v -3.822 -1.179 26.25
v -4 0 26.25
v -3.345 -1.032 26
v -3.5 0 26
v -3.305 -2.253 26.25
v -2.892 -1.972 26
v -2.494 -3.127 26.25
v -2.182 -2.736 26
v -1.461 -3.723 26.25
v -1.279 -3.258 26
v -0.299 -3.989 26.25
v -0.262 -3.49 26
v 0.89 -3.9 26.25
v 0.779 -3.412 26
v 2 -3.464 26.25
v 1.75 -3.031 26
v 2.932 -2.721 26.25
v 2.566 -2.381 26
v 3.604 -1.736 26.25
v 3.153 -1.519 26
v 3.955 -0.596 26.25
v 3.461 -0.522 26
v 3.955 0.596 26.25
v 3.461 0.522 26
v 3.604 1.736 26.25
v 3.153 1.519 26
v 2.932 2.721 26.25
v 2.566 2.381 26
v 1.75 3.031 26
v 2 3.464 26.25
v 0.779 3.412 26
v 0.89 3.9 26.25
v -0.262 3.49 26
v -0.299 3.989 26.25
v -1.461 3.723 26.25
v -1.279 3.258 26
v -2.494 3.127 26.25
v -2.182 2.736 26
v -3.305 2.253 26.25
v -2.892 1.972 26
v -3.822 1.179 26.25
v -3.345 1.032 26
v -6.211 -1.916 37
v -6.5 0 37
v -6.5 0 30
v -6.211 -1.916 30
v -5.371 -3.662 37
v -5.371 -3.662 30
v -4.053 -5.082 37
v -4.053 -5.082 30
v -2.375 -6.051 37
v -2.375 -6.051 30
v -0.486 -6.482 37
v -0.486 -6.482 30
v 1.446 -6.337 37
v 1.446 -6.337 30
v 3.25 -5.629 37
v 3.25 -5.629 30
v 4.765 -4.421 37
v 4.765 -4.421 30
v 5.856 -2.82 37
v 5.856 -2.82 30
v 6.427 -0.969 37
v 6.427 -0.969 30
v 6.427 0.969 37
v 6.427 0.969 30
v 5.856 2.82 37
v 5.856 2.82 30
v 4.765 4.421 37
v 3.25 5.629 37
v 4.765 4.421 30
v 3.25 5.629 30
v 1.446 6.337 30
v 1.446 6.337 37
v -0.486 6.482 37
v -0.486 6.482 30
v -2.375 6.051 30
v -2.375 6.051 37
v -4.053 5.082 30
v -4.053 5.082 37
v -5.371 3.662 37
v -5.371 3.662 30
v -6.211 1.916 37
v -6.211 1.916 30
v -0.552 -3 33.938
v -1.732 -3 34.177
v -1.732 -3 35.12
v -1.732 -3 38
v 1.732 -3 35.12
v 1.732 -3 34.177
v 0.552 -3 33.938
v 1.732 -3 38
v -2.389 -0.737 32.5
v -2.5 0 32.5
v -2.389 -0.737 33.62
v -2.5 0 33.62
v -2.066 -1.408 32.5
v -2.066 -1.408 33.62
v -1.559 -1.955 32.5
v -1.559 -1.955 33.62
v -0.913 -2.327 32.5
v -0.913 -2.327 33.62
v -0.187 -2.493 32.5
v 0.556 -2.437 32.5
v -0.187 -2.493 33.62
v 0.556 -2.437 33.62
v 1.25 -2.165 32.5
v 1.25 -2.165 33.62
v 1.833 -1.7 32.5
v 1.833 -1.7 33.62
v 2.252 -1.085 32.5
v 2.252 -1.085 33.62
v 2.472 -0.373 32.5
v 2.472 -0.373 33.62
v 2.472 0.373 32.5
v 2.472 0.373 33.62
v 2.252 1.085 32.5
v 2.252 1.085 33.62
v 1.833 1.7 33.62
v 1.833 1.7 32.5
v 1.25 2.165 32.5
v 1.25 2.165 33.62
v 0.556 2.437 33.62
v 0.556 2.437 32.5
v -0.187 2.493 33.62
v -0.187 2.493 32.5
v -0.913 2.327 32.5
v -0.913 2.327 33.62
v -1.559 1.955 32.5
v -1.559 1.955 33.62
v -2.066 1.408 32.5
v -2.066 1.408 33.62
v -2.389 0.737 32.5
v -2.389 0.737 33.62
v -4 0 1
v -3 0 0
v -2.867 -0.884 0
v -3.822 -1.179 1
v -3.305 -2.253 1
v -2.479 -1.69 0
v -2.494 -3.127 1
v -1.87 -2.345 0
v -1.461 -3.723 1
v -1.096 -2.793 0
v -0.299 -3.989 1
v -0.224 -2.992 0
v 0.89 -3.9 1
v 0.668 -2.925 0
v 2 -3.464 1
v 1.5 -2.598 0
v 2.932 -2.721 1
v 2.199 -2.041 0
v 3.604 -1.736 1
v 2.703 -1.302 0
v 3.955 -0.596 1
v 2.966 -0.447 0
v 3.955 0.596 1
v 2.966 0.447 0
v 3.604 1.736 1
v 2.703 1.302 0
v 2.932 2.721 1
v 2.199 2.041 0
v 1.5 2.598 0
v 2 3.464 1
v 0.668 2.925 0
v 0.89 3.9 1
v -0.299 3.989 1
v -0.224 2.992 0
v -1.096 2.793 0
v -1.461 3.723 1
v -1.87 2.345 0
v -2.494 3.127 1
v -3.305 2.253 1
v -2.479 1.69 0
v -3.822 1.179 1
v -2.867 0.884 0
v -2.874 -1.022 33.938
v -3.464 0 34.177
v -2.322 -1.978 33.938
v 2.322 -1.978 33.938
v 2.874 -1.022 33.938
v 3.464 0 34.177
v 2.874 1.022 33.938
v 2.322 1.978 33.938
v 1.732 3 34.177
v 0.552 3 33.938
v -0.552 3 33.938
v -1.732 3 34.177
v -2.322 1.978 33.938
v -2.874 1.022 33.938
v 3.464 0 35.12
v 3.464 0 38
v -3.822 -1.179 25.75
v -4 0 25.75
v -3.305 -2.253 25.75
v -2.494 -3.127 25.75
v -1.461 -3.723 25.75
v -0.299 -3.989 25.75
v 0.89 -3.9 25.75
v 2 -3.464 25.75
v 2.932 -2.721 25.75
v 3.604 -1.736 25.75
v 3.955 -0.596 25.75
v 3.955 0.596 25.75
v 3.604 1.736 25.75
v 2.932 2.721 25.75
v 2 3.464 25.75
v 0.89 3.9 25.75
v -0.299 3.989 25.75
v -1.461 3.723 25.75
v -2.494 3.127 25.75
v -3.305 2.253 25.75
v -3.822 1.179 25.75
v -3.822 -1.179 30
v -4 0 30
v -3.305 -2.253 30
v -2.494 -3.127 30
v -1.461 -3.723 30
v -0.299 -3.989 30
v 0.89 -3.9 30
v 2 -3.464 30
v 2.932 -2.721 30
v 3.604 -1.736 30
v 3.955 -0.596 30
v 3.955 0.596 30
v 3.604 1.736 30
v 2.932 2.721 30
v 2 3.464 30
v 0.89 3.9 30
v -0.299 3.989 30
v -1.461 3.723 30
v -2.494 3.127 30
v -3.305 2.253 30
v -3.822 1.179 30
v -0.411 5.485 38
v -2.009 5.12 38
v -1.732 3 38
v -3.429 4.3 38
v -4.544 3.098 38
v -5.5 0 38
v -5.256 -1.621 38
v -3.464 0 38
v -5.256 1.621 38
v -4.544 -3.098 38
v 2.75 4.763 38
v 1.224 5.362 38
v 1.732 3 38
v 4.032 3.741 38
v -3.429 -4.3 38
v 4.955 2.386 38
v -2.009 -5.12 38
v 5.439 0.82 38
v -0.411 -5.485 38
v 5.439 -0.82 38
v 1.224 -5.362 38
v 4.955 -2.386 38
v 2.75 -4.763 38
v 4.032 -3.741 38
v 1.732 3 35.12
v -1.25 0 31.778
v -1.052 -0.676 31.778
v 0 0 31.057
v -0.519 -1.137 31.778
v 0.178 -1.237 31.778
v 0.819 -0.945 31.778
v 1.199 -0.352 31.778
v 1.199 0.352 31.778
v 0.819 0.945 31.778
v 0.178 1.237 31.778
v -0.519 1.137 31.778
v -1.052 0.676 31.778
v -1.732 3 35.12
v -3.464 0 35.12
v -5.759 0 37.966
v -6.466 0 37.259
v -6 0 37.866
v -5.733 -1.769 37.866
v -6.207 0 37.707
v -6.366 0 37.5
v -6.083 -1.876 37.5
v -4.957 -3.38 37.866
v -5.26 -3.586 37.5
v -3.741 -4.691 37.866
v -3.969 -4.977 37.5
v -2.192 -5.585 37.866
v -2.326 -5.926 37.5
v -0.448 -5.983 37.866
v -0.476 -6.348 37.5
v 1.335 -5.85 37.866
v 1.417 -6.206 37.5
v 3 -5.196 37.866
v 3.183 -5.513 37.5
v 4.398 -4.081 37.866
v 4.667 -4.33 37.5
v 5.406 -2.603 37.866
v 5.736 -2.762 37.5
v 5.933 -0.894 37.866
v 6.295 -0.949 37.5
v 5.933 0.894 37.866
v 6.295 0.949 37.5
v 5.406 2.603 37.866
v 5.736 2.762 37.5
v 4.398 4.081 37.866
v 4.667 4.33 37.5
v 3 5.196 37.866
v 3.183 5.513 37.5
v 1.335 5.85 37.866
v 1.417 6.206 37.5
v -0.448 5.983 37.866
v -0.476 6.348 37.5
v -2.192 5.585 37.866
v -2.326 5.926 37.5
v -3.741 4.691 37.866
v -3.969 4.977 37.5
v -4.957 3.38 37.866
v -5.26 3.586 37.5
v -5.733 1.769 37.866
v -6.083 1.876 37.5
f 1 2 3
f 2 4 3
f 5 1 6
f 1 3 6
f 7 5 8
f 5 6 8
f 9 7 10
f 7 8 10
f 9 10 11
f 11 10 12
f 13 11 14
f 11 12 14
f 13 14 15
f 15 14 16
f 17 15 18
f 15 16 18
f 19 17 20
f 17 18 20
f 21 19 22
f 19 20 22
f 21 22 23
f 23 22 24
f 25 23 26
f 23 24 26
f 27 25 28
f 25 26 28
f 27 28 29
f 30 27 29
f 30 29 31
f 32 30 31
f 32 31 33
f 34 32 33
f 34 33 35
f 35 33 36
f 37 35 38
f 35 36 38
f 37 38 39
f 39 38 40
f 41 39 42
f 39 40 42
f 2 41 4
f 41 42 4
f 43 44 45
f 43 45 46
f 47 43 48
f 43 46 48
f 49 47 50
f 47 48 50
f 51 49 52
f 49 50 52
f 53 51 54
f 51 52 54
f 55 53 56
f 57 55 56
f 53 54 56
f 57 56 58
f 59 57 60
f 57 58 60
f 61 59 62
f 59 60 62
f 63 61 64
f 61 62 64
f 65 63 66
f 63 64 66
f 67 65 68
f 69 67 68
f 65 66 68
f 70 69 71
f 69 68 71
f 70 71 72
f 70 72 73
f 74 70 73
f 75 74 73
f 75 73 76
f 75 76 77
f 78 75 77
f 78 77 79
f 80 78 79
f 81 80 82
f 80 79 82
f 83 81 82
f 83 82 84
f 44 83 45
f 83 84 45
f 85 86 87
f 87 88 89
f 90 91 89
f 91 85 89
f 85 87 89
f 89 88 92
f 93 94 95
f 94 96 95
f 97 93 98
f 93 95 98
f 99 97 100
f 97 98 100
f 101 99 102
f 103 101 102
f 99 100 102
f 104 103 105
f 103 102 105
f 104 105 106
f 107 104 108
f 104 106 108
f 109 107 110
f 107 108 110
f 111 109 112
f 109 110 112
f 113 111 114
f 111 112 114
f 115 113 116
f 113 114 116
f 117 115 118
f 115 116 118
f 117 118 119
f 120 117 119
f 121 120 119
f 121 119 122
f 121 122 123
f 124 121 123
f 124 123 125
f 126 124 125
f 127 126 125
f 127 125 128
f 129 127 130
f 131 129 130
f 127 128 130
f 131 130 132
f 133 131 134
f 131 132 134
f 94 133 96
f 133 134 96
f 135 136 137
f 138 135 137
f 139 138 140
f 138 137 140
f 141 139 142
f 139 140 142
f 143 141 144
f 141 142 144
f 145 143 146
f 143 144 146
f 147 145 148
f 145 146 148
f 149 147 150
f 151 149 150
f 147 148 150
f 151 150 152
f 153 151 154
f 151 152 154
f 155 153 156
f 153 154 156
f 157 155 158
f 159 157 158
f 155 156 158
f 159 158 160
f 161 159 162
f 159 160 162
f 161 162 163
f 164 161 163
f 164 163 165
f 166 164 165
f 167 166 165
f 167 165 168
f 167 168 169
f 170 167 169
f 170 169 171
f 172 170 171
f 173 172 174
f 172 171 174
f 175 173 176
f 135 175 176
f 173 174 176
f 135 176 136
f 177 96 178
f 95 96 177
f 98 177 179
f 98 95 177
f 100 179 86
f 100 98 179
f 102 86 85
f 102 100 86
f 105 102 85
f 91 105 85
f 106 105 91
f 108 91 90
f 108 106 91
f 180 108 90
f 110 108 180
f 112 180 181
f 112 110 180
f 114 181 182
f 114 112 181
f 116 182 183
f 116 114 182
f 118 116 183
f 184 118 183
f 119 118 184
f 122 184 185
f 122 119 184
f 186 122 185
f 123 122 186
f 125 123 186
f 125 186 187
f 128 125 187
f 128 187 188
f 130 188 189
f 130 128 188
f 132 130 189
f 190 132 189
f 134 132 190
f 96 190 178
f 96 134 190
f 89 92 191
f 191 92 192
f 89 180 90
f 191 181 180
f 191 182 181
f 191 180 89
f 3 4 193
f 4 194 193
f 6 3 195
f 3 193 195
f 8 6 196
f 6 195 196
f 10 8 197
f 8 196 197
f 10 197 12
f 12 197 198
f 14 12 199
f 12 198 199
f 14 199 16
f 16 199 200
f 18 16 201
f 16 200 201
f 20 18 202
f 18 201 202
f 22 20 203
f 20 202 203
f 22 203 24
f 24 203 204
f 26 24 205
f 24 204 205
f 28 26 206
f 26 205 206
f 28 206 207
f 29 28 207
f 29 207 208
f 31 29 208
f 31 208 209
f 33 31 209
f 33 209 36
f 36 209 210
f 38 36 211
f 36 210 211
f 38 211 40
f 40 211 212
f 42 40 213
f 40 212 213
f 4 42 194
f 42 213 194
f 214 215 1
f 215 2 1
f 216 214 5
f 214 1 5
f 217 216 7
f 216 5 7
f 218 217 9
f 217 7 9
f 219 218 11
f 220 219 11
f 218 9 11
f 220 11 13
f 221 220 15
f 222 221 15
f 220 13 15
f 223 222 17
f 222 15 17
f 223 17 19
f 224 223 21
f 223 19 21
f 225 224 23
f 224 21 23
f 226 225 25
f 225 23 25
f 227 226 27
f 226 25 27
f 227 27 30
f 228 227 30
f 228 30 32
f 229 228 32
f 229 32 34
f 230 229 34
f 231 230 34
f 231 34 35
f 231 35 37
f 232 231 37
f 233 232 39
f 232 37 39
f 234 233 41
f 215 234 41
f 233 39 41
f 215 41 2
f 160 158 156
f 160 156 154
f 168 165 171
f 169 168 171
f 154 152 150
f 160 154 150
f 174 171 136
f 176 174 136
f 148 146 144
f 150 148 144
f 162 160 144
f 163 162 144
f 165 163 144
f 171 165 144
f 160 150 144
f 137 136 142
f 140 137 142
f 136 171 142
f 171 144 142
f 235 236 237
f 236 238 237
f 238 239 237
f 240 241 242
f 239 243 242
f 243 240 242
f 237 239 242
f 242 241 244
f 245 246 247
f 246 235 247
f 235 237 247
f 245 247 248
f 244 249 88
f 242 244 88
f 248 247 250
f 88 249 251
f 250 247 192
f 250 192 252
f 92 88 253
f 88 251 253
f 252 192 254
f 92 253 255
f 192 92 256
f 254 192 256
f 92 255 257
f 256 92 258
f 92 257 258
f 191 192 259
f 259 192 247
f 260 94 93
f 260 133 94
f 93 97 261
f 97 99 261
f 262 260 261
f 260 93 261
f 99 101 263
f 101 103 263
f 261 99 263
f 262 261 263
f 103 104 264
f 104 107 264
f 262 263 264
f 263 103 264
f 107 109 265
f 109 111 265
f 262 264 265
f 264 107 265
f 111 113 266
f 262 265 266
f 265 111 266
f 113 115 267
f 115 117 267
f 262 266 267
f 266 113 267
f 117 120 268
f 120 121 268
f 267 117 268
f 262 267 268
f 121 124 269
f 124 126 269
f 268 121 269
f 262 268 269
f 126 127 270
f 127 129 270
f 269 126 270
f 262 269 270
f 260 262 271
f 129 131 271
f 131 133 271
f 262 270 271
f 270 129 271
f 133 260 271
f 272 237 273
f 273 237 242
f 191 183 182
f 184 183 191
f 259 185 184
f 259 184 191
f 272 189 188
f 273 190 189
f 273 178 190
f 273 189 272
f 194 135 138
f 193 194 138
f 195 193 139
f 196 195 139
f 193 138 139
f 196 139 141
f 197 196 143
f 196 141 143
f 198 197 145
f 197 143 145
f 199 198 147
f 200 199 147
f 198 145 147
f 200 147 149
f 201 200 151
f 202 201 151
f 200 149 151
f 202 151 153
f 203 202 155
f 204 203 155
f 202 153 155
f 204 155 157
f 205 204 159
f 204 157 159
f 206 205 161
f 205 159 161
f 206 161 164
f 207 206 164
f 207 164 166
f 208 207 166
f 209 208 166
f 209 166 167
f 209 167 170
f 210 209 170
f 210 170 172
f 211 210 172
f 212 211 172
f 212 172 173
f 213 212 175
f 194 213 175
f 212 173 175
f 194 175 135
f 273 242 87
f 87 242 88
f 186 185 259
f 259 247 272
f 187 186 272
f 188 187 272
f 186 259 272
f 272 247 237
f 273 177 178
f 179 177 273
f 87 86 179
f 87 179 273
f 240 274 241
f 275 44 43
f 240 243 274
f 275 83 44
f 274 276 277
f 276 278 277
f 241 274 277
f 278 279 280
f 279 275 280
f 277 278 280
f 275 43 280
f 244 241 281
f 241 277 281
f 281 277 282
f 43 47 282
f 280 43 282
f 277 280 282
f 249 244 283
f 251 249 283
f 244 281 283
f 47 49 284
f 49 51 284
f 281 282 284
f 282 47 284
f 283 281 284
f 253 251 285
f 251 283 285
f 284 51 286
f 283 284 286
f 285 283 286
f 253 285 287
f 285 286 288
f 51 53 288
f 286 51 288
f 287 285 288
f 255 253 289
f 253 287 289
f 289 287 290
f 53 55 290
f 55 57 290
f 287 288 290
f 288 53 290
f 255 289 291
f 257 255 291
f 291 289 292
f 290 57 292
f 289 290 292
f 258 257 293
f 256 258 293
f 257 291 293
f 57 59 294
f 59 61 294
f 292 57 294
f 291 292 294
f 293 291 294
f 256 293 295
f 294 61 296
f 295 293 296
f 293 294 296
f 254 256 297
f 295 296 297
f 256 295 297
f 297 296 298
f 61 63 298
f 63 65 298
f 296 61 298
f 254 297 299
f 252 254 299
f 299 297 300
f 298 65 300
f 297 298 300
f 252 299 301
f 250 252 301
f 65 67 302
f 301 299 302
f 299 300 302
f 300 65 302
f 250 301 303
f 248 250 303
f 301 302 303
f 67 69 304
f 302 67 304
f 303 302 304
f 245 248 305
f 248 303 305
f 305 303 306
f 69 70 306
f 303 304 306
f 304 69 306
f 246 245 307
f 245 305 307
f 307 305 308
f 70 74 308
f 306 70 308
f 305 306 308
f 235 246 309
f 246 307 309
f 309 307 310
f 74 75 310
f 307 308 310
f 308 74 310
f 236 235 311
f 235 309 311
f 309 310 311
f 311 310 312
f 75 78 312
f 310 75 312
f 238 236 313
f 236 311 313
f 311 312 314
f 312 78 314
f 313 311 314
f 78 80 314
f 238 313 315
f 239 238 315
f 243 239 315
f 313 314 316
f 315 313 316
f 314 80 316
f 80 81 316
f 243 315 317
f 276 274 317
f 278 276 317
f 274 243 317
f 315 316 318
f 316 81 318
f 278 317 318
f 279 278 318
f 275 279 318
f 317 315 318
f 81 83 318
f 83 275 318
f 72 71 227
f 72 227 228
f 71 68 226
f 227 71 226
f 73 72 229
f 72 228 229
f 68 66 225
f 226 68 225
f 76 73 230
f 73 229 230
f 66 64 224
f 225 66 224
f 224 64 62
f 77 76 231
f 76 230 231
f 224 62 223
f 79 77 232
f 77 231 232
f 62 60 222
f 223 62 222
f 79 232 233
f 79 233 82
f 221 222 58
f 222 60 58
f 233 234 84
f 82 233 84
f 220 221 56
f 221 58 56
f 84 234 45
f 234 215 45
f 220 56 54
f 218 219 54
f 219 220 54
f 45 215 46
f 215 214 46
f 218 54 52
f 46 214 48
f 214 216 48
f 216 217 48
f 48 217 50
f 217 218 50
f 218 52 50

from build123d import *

# Parameters (mm, degrees)
F2_R     = 1
F3_SIZE  = 1
F5_DEPTH = 2.88


# Not quite as in the source:
# - a fillet or chamfer that OpenCascade refuses, or shapes differently, is made with other operations: its cross-section is extruded or revolved along the edge and cut away or added


with BuildPart() as f1:
    # F0 (on Front) → F1 (revolve)
    with BuildSketch(Plane.XZ):
        Polygon((-4, 0), (0, 0), (0, 31.056624327), (-2.5, 32.5), (-2.5, 38), (-6.5, 38), (-6.5, 30), (-4, 30), (-4, 26.25), (-3.5, 26), (-4, 25.75), align=None)
    revolve(axis=Axis((0, 0, 18.332445994), (0, 0, 1)))

    # F2
    f2_edges = [f1.edges().sort_by_distance(p)[0] for p in [
        (6.5, 0, 38),
    ]]
    fillet(f2_edges, radius=F2_R)

    # F3
    f3_edges = [f1.edges().sort_by_distance(p)[0] for p in [
        (4, 0, 0),
    ]]
    chamfer(f3_edges, length=F3_SIZE)

    # F4 (on face) → F5 (cut)
    with BuildSketch(Plane.XY.offset(38)):
        Polygon((-1.7320508076, -3), (1.7320508076, -3), (3.4641016151, 0), (1.7320508076, 3), (-1.7320508076, 3), (-3.4641016151, 0), align=None)
    extrude(amount=-F5_DEPTH, mode=Mode.SUBTRACT)

    # F6: chamfer of 1.5 x 2.5980762114 on 1 edges, made by hand


with BuildPart() as f6_tool2:
    # F6_s3 → F6_t4 (revolve)
    with BuildSketch(Plane.XZ):
        Polygon((-5.0980762114, 35.12), (-2.5, 33.62), (-2.5, 35.12), align=None)
    revolve(axis=Axis((0, 0, 35.12), (0, 0, 1)))

    split(bisect_by=Plane(origin=(-2.5980762114, -1.5, 0), x_dir=(0, 0, 1), z_dir=(0.8660254038, 0.5, 0)), keep=Keep.TOP)

    split(bisect_by=Plane(origin=(-2.5980762114, 1.5, 0), x_dir=(0, 0, 1), z_dir=(0.8660254038, -0.5, 0)), keep=Keep.TOP)

    split(bisect_by=Plane.XZ.offset(-3), keep=Keep.TOP)

    split(bisect_by=Plane(origin=(2.5980762114, 1.5, 0), x_dir=(0, 0, 1), z_dir=(-0.8660254038, -0.5, 0)), keep=Keep.TOP)

    split(bisect_by=Plane(origin=(2.5980762114, -1.5, 0), x_dir=(0, 0, 1), z_dir=(-0.8660254038, 0.5, 0)), keep=Keep.TOP)

    split(bisect_by=Plane.XZ.offset(3), keep=Keep.BOTTOM)


with BuildPart() as f1_1:
    add(f1.part)

    # F6_t1: cut F6_tool2
    add(f6_tool2.part, mode=Mode.SUBTRACT)


solid = f1_1.part
